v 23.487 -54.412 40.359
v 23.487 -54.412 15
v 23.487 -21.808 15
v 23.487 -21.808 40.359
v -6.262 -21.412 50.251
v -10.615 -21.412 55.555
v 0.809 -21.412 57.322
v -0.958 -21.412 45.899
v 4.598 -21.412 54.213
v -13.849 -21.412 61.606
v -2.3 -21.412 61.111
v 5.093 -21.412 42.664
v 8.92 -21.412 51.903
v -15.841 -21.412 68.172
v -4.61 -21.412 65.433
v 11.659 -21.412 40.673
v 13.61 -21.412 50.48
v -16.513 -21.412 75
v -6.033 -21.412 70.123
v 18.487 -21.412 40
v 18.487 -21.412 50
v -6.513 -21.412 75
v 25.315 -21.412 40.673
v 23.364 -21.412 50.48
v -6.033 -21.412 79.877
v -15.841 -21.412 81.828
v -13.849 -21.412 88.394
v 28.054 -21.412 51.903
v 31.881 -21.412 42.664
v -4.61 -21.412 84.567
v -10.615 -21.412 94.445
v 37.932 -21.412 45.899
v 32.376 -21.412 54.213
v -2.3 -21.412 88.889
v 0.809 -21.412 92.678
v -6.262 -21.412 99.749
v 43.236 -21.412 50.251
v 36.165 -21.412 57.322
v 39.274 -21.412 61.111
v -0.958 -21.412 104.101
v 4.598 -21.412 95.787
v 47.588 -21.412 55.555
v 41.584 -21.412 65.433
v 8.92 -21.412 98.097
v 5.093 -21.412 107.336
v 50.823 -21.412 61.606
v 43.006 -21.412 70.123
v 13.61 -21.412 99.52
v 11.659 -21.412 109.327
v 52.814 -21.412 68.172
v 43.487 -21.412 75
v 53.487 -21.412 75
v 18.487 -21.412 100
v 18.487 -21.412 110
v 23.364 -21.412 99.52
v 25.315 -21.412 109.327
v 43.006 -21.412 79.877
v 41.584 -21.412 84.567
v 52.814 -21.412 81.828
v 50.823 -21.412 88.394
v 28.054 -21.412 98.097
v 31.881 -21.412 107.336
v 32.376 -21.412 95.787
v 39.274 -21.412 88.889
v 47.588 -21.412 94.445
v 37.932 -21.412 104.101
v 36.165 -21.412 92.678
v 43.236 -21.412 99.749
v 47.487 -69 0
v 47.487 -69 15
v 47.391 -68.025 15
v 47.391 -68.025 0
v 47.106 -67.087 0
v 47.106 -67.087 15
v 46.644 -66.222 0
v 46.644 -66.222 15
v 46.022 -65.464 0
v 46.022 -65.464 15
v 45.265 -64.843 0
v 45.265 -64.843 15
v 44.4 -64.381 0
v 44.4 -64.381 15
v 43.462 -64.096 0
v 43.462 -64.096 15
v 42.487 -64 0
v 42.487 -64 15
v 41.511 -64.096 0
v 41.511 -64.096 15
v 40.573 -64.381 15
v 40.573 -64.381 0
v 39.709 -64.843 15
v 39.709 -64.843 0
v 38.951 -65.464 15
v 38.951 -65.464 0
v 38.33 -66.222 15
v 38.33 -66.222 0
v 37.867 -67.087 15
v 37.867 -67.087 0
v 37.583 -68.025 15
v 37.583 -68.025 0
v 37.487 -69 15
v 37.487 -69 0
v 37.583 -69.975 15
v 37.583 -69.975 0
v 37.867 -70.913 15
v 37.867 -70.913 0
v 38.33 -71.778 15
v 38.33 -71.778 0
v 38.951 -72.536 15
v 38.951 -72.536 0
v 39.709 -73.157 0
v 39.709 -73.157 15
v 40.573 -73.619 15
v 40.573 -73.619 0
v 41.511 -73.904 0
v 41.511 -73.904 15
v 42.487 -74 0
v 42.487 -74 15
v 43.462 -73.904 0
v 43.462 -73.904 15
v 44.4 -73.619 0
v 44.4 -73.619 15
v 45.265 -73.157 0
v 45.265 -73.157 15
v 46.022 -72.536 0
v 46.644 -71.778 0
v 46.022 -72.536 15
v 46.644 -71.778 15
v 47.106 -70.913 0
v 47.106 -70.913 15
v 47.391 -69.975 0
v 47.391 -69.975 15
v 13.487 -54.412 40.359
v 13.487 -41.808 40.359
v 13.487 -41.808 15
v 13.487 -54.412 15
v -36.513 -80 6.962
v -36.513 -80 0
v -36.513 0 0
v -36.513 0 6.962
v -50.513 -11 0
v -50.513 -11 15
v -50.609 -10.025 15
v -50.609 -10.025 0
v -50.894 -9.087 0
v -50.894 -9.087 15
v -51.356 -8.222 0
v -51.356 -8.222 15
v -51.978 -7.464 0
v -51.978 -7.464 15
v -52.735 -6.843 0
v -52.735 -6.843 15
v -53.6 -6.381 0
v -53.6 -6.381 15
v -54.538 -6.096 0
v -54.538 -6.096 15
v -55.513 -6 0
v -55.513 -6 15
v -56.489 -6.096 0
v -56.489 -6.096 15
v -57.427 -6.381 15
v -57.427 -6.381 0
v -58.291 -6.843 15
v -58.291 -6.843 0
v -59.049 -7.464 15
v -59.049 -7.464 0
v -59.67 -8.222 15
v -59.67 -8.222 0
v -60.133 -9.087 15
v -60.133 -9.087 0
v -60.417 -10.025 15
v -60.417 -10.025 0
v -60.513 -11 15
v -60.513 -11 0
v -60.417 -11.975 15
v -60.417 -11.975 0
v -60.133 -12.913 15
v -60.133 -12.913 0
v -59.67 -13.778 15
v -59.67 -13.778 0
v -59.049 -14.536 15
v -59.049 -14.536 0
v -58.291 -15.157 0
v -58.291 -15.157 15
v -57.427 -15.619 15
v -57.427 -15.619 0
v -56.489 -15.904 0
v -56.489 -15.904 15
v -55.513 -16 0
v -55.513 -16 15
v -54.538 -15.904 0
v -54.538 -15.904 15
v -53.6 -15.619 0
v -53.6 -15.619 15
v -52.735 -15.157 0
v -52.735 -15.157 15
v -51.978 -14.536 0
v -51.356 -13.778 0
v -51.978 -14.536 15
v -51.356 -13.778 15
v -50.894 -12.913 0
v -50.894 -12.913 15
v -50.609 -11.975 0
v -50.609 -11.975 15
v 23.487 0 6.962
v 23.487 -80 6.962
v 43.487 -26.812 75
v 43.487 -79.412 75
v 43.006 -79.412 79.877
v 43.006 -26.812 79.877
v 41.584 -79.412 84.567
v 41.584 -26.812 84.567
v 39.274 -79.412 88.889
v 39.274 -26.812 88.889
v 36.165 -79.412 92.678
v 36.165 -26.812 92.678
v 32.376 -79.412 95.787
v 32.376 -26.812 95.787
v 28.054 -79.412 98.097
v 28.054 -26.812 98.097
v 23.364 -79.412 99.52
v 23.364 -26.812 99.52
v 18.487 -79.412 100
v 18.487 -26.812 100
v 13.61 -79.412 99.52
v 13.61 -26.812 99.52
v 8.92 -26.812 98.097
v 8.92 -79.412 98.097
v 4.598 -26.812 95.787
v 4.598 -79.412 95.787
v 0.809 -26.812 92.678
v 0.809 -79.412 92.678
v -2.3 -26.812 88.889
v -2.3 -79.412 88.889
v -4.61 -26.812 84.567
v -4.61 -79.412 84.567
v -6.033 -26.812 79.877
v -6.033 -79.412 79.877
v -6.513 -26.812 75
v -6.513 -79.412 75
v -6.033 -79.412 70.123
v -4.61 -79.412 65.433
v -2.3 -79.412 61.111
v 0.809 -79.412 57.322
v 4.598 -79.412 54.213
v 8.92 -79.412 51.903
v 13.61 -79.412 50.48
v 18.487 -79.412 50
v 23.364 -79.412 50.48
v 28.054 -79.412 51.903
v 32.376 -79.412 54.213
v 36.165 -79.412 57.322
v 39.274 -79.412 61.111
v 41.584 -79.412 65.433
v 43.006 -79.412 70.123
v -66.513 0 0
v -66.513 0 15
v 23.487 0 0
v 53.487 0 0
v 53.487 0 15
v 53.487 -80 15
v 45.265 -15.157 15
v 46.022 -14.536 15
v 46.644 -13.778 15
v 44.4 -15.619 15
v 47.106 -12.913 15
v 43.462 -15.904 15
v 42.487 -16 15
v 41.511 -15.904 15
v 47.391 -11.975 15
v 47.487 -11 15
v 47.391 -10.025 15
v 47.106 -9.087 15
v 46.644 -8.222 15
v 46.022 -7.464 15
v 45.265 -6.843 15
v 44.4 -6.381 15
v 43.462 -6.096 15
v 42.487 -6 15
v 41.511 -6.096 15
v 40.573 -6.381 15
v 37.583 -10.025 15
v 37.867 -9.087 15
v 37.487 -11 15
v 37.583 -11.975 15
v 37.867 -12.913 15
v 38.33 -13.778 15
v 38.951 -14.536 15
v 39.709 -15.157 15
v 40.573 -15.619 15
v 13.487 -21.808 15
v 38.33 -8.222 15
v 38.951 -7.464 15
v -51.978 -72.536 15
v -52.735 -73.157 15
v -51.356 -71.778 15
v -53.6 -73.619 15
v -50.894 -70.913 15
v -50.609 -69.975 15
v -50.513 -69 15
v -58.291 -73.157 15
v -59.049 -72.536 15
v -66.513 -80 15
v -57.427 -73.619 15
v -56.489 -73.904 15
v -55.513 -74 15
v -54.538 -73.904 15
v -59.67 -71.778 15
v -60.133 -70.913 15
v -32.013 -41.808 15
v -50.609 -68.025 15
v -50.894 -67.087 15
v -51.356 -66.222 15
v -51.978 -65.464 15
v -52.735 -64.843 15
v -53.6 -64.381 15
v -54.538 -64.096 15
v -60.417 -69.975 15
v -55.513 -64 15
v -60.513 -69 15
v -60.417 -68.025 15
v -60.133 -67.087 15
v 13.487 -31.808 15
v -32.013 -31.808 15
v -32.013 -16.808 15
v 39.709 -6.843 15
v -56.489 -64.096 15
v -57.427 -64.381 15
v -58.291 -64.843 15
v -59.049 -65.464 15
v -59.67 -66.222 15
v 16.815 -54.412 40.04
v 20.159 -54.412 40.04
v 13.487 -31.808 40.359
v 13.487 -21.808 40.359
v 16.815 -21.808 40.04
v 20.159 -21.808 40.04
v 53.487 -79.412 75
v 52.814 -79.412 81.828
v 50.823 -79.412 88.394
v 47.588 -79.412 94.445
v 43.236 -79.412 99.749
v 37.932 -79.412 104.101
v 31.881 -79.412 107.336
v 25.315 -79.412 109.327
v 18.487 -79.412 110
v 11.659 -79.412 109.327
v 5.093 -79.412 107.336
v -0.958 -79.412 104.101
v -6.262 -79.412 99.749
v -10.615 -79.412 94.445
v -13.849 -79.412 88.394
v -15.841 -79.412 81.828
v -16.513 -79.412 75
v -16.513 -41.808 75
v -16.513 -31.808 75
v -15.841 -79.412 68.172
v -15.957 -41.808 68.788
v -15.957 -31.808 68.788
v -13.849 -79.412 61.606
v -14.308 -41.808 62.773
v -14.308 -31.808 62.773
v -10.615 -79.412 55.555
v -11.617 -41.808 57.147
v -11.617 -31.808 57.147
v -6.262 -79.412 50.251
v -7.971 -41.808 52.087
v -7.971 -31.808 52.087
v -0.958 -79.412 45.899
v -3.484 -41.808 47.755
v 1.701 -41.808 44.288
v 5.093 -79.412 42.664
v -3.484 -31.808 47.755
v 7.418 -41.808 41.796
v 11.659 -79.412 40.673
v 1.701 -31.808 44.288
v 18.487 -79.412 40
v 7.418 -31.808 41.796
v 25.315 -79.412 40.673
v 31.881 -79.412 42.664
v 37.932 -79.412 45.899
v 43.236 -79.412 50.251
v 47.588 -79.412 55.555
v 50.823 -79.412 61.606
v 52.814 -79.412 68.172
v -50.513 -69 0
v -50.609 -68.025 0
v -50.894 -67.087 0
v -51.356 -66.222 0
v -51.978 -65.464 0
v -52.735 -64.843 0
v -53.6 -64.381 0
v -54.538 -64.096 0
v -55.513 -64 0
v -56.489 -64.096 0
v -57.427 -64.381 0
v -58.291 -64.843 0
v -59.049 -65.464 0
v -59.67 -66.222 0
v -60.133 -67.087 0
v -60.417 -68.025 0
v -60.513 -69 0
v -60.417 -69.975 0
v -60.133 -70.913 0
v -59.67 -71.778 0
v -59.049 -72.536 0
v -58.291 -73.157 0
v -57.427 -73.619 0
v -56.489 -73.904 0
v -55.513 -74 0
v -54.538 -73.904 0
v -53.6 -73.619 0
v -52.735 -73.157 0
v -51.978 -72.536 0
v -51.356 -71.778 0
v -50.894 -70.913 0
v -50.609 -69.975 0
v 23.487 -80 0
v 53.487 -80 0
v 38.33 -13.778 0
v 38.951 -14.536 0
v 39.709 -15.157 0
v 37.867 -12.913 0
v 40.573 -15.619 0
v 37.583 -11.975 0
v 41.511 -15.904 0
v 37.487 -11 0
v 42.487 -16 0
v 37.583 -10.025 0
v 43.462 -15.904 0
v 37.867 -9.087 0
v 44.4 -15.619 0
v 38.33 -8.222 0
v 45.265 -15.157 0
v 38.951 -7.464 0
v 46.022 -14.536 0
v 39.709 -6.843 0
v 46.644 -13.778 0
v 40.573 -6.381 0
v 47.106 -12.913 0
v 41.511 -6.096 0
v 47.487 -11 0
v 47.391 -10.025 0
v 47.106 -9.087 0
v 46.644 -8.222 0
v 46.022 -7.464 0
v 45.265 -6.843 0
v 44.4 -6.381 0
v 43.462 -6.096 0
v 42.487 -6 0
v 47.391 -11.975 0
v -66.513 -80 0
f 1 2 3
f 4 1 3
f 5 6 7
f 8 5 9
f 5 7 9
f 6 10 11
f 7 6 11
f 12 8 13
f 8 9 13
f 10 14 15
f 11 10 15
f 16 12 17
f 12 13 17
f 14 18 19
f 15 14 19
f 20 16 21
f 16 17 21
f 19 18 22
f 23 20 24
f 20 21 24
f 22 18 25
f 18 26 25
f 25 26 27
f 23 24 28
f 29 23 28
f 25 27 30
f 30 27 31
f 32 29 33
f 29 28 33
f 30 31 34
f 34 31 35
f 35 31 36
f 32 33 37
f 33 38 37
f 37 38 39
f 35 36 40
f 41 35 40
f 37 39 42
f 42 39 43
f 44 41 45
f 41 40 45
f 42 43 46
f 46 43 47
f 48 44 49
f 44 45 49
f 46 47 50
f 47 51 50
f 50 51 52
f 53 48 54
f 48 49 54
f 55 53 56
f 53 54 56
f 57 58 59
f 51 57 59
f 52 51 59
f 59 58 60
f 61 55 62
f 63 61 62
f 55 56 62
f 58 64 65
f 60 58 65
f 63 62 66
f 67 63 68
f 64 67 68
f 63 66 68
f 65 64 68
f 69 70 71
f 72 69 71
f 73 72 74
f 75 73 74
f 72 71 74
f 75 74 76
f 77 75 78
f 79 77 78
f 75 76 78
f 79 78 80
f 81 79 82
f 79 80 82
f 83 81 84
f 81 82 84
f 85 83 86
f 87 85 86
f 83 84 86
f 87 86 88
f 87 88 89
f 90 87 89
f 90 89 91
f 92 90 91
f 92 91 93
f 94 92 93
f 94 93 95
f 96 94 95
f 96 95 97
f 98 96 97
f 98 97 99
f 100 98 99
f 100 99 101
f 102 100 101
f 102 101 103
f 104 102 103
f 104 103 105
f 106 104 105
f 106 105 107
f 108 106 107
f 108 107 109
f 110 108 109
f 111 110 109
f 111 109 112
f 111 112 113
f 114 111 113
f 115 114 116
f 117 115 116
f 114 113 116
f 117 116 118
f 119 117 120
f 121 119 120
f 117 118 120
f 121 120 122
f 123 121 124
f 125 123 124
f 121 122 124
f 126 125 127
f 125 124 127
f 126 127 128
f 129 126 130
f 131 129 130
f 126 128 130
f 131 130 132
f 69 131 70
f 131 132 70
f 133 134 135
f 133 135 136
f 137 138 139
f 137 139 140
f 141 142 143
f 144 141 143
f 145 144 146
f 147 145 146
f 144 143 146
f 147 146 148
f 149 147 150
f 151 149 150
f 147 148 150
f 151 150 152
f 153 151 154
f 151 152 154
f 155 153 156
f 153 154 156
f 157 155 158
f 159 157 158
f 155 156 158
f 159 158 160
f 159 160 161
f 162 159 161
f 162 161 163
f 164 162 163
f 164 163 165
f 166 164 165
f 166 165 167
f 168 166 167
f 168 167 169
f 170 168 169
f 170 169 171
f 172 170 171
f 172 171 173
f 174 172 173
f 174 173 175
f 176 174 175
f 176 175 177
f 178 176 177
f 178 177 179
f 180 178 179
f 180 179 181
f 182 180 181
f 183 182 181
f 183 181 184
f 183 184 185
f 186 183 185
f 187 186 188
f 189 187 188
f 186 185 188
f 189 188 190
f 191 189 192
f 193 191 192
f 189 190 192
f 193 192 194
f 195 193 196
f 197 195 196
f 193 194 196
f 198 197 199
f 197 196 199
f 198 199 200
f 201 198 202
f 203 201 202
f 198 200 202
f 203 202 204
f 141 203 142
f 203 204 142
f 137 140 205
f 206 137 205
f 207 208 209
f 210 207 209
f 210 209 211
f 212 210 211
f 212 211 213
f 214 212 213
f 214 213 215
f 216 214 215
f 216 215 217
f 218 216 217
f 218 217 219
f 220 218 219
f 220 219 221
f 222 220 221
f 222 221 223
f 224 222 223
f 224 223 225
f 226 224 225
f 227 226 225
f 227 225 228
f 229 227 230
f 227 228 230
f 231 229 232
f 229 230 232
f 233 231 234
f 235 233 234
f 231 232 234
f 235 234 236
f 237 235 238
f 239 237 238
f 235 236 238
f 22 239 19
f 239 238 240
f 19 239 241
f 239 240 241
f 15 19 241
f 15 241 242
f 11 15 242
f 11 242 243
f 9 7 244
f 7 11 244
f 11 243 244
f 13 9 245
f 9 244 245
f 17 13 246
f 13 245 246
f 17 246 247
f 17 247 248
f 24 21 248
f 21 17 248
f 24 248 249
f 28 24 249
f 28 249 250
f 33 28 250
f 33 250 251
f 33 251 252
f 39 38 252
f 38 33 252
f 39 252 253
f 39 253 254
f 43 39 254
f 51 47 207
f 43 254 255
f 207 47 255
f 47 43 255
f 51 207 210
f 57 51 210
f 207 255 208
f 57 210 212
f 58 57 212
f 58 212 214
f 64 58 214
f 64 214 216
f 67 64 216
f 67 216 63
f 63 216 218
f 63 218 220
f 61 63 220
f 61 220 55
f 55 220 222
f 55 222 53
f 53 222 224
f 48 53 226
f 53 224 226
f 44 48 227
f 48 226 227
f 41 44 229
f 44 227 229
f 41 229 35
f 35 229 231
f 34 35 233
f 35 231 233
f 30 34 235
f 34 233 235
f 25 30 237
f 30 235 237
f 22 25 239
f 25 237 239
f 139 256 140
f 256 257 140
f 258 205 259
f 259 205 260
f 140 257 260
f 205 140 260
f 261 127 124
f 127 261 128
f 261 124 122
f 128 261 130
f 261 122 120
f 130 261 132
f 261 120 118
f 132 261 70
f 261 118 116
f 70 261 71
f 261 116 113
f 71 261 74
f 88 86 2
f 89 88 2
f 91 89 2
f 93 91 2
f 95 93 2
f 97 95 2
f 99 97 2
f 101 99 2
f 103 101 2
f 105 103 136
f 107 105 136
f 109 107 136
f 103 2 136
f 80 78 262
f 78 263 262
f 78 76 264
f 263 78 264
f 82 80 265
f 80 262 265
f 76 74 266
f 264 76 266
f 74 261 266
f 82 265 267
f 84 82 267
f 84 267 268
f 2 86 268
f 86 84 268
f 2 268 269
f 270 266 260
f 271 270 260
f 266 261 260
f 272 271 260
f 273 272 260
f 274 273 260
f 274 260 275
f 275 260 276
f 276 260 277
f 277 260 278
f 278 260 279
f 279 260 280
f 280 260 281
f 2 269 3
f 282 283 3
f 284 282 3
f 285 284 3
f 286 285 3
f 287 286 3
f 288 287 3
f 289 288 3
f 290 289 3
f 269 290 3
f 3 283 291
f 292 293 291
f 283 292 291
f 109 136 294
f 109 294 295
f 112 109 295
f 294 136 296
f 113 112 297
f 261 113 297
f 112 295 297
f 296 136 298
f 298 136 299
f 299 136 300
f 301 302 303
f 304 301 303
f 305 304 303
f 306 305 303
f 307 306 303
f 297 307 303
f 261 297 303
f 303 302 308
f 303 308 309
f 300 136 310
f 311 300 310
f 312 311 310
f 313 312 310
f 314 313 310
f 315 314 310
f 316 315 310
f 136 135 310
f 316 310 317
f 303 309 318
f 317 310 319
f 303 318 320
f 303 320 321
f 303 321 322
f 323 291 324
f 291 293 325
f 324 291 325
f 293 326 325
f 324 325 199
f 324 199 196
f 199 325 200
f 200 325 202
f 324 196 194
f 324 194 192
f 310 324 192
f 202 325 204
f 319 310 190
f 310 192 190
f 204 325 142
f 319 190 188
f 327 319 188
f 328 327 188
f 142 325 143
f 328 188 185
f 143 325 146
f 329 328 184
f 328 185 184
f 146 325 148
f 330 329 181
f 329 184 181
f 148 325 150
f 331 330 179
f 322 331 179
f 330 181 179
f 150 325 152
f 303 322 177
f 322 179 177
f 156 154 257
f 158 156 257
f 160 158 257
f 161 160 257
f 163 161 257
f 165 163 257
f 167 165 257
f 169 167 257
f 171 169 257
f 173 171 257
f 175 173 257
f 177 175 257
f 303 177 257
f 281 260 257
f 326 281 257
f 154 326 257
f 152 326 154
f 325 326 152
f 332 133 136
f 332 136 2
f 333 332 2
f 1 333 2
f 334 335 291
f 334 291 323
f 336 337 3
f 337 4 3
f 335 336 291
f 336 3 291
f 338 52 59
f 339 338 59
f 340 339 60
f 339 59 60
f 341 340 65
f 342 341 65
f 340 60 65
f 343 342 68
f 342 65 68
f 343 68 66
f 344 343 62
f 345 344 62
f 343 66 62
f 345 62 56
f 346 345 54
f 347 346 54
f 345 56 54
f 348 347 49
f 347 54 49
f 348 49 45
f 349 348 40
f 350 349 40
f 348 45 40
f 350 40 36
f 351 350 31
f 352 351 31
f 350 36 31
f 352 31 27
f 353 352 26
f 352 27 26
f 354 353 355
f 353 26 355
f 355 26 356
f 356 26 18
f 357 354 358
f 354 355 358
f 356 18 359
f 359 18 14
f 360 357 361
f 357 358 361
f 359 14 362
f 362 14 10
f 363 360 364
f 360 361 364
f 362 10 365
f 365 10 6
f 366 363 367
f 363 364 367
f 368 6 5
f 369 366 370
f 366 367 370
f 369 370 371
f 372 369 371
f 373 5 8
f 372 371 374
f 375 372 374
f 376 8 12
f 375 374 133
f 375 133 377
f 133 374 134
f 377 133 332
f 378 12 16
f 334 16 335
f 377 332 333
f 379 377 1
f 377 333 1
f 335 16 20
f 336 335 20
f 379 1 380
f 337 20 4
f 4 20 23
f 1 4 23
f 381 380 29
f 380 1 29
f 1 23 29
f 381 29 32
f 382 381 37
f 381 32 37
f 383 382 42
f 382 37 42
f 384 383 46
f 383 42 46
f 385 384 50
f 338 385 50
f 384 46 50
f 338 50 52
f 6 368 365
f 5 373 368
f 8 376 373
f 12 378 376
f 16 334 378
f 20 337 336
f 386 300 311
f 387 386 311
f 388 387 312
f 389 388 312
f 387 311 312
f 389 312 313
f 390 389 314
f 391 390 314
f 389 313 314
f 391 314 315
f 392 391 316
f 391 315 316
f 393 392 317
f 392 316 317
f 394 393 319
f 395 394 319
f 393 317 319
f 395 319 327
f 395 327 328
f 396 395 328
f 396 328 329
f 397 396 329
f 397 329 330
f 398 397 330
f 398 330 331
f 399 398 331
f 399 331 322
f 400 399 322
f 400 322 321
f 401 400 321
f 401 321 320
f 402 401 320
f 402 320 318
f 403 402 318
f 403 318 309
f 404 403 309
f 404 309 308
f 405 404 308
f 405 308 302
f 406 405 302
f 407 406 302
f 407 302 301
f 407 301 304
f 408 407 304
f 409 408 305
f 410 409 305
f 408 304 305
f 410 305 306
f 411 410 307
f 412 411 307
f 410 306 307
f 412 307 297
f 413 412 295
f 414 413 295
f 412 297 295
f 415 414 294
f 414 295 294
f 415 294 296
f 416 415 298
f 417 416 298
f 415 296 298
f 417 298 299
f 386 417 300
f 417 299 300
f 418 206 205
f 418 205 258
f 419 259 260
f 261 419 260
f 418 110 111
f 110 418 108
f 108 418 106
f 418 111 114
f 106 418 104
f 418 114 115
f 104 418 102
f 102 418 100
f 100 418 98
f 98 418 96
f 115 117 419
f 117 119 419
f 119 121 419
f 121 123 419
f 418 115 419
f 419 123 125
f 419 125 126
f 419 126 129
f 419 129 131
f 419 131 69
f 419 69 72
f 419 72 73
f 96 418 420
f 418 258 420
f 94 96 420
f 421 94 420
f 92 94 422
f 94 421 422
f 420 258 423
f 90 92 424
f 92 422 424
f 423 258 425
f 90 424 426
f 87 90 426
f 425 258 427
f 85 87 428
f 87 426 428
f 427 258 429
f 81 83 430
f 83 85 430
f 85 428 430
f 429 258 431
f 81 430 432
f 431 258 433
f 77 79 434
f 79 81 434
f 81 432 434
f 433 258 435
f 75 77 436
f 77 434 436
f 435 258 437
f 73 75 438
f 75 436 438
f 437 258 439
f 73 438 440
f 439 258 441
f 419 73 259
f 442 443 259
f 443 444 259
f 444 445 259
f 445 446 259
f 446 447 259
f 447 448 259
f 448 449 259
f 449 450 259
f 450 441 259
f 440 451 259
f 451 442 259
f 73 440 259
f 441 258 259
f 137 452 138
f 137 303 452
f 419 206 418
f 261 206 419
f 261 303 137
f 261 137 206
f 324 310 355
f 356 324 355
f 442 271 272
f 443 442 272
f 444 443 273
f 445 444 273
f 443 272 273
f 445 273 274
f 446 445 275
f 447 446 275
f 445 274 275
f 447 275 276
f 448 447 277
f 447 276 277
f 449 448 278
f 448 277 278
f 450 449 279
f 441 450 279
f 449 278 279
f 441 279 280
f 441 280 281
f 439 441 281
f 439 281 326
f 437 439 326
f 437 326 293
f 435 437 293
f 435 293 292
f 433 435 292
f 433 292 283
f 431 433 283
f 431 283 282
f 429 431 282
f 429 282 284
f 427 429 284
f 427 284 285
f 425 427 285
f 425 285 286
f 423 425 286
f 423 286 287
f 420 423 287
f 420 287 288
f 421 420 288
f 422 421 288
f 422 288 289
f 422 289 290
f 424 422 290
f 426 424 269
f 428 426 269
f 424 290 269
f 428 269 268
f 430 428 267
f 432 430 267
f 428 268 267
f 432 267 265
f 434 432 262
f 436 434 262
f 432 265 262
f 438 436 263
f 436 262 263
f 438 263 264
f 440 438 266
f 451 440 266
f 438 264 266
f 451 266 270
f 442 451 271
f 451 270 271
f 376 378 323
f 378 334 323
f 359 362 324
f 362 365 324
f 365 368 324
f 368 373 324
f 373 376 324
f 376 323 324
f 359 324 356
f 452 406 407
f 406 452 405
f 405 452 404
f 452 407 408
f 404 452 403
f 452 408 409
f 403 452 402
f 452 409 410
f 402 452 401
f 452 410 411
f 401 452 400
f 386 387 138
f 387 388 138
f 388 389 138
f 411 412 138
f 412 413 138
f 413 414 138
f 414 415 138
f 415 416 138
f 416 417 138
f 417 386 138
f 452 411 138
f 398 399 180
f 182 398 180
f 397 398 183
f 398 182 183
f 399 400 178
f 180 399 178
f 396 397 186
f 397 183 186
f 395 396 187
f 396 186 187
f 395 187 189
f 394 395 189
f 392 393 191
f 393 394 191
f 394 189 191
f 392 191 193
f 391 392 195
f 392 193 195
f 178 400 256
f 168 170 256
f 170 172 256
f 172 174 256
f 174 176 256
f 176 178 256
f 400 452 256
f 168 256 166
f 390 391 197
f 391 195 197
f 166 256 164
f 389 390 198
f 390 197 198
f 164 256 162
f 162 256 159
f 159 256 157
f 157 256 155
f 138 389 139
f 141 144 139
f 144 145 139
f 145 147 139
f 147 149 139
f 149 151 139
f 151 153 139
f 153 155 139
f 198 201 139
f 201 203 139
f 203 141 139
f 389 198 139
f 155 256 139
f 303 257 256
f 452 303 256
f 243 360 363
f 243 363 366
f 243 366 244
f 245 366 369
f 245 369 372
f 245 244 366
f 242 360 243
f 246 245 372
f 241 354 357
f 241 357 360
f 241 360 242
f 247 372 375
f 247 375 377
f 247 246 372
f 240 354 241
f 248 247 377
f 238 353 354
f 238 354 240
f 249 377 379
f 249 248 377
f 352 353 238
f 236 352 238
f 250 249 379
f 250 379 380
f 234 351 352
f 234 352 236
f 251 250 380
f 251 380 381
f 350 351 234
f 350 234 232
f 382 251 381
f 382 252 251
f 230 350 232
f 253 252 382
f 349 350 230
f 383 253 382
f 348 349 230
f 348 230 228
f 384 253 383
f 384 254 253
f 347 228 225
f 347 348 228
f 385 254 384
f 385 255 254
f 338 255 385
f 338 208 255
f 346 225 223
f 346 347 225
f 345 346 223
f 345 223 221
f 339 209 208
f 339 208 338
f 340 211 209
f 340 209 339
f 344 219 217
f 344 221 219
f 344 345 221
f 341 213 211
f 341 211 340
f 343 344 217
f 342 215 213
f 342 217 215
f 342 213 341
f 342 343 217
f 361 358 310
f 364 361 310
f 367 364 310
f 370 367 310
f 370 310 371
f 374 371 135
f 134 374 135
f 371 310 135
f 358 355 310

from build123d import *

# Parameters (mm, degrees)
F1_DEPTH  = 80
F2_R      = 5
F3_DEPTH  = 25
F5_DEPTH  = 60
F6_R      = 35
F7_DEPTH  = 33
F8_DEPTH  = 25
F9_R      = 25
F10_DEPTH = 52.6
F11_R     = 25
F12_DEPTH = 52.6
F14_DEPTH = 25


with BuildPart() as f1:
    # F0 (on Front) → F1 (new body)
    with BuildSketch(Plane.XZ):
        Polygon((-66.513142, 0), (-36.513142, 0), (-36.513142, 6.962258), (23.486858, 6.962258), (23.486858, 0), (53.486858, 0), (53.486858, 15), (-66.513142, 15), align=None)
    extrude(amount=F1_DEPTH)

    # F2 (on face) → F3 (cut)
    with BuildSketch(Plane.XY.offset(15)):
        with Locations((42.486858, -11)):
            Circle(F2_R)
        with Locations((42.486858, -69)):
            Circle(F2_R)
        with Locations((-55.513142, -69)):
            Circle(F2_R)
        with Locations((-55.513142, -11)):
            Circle(F2_R)
    extrude(amount=-F3_DEPTH, mode=Mode.SUBTRACT)

    # F4 (on face) → F5 (join)
    with BuildSketch(Plane.XY.offset(15)):
        Polygon((23.486858, -54.41226), (23.486858, -21.807771), (13.486858, -21.807771), (13.486858, -31.807771), (-32.013142, -31.807771), (-32.013142, -41.807771), (13.486858, -41.807771), (13.486858, -54.41226), align=None)
    extrude(amount=F5_DEPTH)

    # F6 (on face) → F7 (join)
    with BuildSketch(Plane.XZ.offset(54.41226)):
        with Locations((18.486858, 75)):
            Circle(F6_R)
    extrude(amount=-F7_DEPTH)

    # F6 (on face) → F8 (join)
    with BuildSketch(Plane.XZ.offset(54.41226)):
        with Locations((18.486858, 75)):
            Circle(F6_R)
    extrude(amount=F8_DEPTH)

    # F9 (on face) → F10 (cut)
    with BuildSketch(Plane.XZ.offset(79.41226)):
        with Locations((18.486858, 75)):
            Circle(F9_R)
    extrude(amount=-F10_DEPTH, mode=Mode.SUBTRACT)

    # F11 (on face) → F12 (cut)
    with BuildSketch(Plane(origin=(0, -21.41226, 0), x_dir=(-1, 0, 0), z_dir=(0, 1, 0))):
        with Locations((-18.486858, 75)):
            Circle(F11_R)
    extrude(amount=-F12_DEPTH, mode=Mode.SUBTRACT)

    # F13 (on face) → F14 (cut)
    with BuildSketch(Plane.XZ.offset(41.807771)):
        Polygon((-32.013142, 15), (-16.513142, 75), (-32.013142, 75), align=None)
    extrude(amount=-F14_DEPTH, mode=Mode.SUBTRACT)


solid = f1.part
